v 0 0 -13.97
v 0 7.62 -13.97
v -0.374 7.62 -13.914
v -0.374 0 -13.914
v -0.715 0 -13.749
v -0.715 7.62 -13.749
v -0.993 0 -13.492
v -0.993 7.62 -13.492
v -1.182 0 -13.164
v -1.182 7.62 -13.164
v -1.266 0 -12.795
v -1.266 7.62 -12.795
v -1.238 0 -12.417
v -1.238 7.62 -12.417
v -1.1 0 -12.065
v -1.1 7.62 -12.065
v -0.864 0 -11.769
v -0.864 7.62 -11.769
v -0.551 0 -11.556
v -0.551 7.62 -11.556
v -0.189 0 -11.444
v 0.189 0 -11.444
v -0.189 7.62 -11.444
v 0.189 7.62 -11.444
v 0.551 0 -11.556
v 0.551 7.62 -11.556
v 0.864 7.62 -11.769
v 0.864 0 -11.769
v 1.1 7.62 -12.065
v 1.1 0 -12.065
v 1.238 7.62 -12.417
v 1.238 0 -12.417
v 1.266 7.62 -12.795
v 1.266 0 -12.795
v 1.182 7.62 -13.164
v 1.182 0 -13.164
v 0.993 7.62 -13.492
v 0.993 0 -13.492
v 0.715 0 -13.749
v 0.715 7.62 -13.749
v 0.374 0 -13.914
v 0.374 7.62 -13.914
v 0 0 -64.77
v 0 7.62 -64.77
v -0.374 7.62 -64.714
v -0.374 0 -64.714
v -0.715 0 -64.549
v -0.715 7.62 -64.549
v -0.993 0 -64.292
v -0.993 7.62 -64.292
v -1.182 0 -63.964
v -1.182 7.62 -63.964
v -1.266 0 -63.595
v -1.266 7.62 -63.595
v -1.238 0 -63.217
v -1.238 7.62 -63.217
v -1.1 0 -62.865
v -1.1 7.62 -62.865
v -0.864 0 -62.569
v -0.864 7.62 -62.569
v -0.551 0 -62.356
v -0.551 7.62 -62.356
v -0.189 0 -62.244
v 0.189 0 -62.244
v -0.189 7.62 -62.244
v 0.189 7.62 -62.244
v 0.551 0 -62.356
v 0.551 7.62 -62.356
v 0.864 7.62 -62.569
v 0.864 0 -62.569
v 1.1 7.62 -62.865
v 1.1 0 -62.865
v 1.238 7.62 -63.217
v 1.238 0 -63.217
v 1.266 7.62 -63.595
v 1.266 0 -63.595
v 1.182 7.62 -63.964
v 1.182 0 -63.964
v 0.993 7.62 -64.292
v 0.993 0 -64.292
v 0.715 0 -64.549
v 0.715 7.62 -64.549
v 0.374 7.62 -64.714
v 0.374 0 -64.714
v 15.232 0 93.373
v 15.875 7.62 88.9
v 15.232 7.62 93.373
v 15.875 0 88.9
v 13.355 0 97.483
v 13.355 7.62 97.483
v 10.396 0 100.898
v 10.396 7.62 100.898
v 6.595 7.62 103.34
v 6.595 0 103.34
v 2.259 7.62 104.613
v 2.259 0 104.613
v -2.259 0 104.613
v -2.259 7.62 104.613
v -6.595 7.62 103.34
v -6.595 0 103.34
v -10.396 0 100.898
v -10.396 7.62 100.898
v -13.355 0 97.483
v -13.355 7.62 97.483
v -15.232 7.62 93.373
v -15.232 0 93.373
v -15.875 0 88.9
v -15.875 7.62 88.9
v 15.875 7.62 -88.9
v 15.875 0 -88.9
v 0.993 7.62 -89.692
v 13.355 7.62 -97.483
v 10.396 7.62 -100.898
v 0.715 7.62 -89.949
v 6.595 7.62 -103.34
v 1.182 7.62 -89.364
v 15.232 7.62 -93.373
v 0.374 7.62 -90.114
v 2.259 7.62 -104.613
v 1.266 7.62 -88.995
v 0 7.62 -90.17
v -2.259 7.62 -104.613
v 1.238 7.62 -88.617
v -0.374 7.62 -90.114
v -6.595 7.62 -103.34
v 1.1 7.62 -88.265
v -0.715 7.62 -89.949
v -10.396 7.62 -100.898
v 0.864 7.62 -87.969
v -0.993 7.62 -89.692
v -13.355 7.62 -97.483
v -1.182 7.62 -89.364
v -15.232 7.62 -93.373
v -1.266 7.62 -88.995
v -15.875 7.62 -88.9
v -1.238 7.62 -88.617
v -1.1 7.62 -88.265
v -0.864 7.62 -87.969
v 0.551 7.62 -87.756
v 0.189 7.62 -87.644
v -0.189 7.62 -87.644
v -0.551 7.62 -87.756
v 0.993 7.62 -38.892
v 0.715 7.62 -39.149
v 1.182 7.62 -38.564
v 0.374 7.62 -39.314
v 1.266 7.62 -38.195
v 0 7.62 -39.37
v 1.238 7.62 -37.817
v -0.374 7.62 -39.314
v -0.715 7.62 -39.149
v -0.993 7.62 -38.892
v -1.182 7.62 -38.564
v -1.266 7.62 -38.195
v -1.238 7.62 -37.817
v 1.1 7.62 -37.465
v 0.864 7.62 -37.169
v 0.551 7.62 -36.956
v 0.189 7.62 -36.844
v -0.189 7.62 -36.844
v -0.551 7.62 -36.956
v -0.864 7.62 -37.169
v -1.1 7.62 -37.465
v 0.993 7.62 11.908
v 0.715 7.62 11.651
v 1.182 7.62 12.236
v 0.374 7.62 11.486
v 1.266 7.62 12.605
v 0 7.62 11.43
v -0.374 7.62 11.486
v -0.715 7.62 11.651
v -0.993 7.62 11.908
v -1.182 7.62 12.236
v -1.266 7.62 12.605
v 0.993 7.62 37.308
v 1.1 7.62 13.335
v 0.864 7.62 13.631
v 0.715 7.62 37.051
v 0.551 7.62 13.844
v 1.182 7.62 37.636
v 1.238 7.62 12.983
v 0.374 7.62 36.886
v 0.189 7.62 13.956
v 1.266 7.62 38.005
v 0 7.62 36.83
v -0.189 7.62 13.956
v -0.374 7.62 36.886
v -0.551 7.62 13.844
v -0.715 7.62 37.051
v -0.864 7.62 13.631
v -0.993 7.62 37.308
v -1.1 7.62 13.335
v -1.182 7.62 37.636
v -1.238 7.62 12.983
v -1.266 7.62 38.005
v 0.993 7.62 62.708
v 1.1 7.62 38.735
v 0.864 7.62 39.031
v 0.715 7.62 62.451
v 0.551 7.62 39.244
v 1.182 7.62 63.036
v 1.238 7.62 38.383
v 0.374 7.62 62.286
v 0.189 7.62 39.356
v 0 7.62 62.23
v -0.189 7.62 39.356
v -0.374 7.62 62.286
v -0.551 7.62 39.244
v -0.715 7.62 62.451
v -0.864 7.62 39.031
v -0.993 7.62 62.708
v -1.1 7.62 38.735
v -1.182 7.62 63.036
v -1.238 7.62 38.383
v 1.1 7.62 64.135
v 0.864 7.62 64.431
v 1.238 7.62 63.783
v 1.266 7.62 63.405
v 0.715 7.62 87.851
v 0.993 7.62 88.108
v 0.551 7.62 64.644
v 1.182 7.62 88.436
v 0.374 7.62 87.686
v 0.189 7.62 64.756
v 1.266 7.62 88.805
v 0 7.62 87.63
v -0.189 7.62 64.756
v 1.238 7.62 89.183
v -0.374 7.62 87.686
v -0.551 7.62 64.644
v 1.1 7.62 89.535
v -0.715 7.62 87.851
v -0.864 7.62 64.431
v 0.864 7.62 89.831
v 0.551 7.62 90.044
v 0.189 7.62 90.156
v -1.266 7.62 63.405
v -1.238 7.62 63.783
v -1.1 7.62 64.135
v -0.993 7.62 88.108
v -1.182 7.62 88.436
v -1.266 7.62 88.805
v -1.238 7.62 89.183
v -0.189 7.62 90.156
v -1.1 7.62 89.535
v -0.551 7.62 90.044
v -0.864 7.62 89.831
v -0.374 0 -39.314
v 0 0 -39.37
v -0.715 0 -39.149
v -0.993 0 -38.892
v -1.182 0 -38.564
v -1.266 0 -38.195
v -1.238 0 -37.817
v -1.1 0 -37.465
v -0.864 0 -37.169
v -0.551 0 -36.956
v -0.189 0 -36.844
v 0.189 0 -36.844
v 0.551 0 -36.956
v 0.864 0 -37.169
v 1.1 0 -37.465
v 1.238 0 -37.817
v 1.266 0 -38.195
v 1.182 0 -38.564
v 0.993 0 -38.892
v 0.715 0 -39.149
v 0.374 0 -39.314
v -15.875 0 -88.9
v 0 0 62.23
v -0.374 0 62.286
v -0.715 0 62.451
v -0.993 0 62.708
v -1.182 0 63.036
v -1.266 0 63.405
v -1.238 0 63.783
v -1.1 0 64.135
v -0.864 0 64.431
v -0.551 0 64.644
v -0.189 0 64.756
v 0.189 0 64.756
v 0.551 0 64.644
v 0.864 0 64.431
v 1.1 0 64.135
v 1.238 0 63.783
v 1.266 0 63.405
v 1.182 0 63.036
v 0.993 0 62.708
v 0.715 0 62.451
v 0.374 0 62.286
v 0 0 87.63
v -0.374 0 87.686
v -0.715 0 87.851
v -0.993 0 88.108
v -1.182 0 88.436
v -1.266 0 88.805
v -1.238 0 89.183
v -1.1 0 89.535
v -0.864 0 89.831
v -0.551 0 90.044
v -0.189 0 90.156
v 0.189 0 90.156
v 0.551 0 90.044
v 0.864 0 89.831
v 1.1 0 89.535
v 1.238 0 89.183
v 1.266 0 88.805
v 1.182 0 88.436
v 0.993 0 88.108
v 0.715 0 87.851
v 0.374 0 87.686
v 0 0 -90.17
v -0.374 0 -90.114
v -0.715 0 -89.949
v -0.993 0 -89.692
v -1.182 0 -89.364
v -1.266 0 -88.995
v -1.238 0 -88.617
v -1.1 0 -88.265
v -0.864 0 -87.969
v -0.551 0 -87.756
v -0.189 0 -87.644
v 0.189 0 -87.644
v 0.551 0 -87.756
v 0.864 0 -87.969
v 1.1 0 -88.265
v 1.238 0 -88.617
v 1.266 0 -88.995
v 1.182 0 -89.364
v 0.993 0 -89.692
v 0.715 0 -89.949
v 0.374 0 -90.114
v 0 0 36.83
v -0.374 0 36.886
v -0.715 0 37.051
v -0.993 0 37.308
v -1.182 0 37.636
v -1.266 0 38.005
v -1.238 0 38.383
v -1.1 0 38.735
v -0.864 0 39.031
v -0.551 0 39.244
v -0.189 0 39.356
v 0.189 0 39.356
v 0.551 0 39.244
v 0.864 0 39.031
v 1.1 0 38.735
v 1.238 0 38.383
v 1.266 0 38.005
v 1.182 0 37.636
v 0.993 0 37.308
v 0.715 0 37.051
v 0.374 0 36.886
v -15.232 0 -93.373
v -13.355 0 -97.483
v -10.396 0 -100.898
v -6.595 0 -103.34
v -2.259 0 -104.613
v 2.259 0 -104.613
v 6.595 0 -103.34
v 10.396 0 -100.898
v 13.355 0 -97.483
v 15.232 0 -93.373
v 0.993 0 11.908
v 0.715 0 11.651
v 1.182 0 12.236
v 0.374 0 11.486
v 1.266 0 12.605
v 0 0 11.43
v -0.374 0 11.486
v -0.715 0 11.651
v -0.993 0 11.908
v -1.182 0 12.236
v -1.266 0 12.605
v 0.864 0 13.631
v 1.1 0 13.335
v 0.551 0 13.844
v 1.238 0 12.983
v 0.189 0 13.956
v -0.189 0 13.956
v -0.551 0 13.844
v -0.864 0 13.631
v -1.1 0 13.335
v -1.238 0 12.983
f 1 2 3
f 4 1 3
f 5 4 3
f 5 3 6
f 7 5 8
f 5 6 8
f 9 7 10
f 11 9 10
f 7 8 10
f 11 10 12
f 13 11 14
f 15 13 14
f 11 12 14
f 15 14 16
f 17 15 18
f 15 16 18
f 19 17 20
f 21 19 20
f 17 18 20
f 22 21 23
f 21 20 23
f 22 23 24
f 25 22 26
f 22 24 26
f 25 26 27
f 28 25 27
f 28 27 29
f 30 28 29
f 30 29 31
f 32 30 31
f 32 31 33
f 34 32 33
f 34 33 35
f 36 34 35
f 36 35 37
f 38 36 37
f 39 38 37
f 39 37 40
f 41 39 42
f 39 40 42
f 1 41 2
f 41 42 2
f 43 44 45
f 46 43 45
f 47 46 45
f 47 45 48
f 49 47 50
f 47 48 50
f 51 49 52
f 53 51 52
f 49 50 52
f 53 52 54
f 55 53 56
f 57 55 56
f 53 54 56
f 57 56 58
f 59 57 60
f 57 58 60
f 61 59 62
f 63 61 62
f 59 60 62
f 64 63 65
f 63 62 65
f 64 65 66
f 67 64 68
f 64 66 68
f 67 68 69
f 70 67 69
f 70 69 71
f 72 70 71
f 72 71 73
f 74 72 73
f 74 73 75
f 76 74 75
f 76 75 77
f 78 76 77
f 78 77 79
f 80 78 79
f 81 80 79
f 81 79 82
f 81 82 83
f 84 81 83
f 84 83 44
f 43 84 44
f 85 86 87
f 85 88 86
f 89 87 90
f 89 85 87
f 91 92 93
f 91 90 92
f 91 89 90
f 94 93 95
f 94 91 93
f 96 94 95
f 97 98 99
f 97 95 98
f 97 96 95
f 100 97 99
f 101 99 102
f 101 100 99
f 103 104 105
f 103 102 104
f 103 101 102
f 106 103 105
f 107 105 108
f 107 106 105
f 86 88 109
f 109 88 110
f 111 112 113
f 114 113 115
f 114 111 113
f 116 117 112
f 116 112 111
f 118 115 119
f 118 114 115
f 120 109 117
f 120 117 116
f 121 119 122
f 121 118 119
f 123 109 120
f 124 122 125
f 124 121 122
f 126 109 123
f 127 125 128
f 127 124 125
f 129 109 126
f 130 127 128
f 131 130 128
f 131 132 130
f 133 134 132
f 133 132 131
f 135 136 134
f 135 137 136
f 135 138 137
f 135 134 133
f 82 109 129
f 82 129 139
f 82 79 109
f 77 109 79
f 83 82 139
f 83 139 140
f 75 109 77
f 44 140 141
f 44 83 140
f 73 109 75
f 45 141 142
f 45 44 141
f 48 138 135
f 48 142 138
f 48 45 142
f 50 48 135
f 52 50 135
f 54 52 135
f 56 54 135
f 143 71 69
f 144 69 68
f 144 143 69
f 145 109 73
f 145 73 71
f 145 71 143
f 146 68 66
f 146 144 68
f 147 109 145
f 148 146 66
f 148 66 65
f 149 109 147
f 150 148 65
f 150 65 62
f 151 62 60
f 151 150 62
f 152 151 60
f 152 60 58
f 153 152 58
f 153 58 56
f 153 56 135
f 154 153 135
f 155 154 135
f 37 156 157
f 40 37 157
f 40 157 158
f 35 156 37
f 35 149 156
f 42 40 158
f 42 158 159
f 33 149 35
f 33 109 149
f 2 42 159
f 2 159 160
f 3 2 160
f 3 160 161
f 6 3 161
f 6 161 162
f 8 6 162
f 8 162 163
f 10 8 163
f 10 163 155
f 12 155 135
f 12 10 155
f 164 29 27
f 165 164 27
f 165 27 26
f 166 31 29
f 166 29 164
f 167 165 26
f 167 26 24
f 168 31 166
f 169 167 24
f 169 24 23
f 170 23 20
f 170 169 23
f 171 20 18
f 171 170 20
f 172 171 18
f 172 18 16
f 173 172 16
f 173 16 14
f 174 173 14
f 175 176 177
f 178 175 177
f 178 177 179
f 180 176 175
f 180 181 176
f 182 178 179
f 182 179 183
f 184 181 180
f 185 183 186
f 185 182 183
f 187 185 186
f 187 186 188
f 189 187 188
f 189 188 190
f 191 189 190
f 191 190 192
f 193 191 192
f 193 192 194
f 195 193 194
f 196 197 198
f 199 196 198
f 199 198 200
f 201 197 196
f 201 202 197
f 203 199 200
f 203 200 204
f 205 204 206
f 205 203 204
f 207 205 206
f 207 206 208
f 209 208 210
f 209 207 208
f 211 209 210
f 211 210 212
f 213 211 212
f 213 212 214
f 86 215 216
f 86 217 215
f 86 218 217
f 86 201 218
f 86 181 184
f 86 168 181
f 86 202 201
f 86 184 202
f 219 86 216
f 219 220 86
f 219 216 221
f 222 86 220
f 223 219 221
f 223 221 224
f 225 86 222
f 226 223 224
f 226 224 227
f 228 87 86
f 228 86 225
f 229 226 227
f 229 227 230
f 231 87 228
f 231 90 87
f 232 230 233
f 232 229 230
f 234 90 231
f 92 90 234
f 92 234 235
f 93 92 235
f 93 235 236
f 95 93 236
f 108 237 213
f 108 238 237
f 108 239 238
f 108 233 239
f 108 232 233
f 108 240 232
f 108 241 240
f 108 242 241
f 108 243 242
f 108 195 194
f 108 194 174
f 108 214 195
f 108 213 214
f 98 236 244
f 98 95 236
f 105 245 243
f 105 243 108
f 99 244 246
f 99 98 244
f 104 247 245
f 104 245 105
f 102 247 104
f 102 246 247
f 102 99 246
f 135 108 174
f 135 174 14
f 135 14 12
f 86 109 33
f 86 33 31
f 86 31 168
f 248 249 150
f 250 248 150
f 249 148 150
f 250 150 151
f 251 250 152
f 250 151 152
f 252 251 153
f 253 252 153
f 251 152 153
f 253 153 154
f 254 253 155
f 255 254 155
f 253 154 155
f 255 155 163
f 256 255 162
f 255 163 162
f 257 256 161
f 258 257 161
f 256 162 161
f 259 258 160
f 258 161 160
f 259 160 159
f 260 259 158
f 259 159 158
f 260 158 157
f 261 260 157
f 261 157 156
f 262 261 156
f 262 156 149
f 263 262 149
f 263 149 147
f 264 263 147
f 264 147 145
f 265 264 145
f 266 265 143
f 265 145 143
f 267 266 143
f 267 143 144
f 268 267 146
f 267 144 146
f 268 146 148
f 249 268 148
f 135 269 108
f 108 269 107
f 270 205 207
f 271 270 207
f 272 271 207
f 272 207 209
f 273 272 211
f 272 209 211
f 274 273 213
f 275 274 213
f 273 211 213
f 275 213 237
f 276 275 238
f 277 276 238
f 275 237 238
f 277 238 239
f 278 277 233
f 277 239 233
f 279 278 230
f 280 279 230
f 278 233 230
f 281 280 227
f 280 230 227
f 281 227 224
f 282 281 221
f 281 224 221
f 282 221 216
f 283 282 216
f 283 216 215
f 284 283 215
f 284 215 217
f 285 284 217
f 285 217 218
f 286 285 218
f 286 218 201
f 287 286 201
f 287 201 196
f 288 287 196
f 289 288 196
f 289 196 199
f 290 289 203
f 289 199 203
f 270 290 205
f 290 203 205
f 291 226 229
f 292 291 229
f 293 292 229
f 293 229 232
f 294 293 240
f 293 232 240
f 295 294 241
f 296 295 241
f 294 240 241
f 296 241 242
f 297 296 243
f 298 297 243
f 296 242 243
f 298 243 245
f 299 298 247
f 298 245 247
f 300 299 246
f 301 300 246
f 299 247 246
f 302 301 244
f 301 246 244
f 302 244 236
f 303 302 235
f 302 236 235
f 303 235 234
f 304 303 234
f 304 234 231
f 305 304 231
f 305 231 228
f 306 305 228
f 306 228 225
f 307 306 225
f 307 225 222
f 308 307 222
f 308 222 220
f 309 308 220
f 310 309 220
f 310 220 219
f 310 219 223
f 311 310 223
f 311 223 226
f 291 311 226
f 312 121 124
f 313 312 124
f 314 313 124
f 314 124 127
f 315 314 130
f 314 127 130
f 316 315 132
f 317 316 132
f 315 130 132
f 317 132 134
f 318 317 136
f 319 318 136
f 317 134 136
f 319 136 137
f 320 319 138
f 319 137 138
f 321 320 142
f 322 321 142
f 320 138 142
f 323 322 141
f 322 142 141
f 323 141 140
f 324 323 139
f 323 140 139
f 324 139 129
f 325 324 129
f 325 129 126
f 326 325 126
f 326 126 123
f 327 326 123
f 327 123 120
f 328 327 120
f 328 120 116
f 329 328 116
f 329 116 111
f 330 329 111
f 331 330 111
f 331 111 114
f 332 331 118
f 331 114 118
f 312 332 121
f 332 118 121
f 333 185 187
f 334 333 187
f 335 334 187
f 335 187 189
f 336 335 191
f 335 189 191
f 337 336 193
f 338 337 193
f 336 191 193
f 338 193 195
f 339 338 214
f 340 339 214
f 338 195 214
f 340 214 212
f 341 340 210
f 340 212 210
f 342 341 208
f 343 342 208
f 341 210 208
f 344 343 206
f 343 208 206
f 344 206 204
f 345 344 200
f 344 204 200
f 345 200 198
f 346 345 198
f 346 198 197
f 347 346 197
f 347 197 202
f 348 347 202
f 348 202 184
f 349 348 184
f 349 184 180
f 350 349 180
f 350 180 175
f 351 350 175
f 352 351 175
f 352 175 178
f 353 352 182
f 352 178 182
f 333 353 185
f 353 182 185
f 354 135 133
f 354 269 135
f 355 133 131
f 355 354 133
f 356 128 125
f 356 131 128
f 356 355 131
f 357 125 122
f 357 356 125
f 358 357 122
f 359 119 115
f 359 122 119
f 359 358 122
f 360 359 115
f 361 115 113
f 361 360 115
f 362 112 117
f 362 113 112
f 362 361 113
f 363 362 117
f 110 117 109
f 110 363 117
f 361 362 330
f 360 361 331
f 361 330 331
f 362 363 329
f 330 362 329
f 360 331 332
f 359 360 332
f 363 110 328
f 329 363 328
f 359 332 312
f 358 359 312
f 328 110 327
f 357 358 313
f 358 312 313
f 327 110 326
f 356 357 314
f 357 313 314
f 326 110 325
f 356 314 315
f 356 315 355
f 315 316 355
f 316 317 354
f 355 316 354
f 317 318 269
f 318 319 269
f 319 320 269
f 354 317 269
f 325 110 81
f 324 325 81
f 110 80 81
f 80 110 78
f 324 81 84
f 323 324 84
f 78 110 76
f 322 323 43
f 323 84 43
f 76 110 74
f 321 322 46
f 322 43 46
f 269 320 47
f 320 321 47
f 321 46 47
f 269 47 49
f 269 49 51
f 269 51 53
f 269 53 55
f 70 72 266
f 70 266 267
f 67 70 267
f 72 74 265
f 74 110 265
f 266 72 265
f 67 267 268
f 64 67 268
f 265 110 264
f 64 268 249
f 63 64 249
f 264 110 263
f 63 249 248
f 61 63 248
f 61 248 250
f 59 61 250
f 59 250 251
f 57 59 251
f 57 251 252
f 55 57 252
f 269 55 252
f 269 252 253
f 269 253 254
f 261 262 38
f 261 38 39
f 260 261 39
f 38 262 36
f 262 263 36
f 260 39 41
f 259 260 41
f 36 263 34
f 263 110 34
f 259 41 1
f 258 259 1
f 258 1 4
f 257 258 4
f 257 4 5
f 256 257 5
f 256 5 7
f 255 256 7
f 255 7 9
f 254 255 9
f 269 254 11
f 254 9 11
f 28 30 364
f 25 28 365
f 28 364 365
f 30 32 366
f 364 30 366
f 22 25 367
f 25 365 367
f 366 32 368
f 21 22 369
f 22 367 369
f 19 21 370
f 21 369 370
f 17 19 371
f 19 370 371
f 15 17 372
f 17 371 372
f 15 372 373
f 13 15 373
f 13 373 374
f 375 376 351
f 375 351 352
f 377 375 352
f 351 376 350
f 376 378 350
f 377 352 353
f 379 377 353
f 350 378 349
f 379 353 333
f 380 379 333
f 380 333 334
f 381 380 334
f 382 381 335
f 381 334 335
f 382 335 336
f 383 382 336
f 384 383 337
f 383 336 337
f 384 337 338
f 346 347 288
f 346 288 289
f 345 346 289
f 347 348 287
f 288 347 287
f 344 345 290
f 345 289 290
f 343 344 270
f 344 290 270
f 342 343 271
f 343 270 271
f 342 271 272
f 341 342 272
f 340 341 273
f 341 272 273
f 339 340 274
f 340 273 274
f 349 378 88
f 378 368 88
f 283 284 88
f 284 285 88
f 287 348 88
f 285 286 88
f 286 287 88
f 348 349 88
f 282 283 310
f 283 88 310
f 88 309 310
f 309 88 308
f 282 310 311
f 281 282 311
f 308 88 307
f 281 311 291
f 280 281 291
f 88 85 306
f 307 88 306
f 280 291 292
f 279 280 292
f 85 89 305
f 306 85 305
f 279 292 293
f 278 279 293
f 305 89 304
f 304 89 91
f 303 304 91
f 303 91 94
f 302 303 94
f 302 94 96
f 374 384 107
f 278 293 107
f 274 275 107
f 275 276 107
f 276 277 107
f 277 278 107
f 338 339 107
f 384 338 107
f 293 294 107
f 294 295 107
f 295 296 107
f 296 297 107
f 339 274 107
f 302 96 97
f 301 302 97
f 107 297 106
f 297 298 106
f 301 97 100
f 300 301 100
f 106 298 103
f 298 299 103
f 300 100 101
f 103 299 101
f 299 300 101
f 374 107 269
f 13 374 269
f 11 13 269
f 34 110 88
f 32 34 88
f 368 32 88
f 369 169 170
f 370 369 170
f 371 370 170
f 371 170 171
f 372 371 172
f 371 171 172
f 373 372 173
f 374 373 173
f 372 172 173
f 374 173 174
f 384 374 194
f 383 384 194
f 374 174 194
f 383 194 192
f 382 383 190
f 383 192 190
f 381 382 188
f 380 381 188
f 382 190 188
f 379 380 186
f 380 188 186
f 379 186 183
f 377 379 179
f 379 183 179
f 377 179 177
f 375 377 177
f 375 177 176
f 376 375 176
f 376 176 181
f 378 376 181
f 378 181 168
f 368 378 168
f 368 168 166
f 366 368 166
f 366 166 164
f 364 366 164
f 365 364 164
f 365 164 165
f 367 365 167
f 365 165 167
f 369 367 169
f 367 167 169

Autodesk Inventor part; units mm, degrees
ref_plane "YZ Plane" through (0, 0, 0) normal (1, 0, 0) x (0, 1, 0)
ref_plane "XZ Plane" through (0, 0, 0) normal (0, 1, 0) x (-1, 0, 0)
ref_plane "XY Plane" through (0, 0, 0) normal (0, 0, 1) x (1, 0, 0)
sketch "Sketch1" plane through (0, 0, 0) normal (0, 1, 0) x (-1, 0, 0)
  line L0 (0, -88.9) -> (0, 88.9) construction
  line L1 (15.875, -88.9) -> (15.875, 88.9)
  line L2 (-15.875, 88.9) -> (-15.875, -88.9)
  arc A0 (-15.875, -88.9) -> (15.875, -88.9) centre (0, -88.9) ccw
  arc A1 (15.875, 88.9) -> (-15.875, 88.9) centre (0, 88.9) ccw
  point P0 (0, 0)
  point P1 (0, 63.5)
  point P2 (0, 38.1)
  point P3 (0, 12.7)
  point P4 (0, -12.7)
  point P5 (0, -38.1)
  point P6 (0, -63.5)
  point P7 (0, -88.9)
  dimension "d0" = 31.75
  dimension "d1" = 177.8
  dimension "d4" = 25.4
extrude "Extrusion1" add sketch "Sketch1" along normal blind 7.62
hole "Hole1" at (0, 0, 88.9) at (0, 0, 63.5) at (0, 0, 38.1) at (0, 0, 12.7) at (0, 0, -12.7) at (0, 0, -38.1) at (0, 0, -63.5) at (0, 0, -88.9) direction (0, 1, 0) diameter 2.54 end through all
